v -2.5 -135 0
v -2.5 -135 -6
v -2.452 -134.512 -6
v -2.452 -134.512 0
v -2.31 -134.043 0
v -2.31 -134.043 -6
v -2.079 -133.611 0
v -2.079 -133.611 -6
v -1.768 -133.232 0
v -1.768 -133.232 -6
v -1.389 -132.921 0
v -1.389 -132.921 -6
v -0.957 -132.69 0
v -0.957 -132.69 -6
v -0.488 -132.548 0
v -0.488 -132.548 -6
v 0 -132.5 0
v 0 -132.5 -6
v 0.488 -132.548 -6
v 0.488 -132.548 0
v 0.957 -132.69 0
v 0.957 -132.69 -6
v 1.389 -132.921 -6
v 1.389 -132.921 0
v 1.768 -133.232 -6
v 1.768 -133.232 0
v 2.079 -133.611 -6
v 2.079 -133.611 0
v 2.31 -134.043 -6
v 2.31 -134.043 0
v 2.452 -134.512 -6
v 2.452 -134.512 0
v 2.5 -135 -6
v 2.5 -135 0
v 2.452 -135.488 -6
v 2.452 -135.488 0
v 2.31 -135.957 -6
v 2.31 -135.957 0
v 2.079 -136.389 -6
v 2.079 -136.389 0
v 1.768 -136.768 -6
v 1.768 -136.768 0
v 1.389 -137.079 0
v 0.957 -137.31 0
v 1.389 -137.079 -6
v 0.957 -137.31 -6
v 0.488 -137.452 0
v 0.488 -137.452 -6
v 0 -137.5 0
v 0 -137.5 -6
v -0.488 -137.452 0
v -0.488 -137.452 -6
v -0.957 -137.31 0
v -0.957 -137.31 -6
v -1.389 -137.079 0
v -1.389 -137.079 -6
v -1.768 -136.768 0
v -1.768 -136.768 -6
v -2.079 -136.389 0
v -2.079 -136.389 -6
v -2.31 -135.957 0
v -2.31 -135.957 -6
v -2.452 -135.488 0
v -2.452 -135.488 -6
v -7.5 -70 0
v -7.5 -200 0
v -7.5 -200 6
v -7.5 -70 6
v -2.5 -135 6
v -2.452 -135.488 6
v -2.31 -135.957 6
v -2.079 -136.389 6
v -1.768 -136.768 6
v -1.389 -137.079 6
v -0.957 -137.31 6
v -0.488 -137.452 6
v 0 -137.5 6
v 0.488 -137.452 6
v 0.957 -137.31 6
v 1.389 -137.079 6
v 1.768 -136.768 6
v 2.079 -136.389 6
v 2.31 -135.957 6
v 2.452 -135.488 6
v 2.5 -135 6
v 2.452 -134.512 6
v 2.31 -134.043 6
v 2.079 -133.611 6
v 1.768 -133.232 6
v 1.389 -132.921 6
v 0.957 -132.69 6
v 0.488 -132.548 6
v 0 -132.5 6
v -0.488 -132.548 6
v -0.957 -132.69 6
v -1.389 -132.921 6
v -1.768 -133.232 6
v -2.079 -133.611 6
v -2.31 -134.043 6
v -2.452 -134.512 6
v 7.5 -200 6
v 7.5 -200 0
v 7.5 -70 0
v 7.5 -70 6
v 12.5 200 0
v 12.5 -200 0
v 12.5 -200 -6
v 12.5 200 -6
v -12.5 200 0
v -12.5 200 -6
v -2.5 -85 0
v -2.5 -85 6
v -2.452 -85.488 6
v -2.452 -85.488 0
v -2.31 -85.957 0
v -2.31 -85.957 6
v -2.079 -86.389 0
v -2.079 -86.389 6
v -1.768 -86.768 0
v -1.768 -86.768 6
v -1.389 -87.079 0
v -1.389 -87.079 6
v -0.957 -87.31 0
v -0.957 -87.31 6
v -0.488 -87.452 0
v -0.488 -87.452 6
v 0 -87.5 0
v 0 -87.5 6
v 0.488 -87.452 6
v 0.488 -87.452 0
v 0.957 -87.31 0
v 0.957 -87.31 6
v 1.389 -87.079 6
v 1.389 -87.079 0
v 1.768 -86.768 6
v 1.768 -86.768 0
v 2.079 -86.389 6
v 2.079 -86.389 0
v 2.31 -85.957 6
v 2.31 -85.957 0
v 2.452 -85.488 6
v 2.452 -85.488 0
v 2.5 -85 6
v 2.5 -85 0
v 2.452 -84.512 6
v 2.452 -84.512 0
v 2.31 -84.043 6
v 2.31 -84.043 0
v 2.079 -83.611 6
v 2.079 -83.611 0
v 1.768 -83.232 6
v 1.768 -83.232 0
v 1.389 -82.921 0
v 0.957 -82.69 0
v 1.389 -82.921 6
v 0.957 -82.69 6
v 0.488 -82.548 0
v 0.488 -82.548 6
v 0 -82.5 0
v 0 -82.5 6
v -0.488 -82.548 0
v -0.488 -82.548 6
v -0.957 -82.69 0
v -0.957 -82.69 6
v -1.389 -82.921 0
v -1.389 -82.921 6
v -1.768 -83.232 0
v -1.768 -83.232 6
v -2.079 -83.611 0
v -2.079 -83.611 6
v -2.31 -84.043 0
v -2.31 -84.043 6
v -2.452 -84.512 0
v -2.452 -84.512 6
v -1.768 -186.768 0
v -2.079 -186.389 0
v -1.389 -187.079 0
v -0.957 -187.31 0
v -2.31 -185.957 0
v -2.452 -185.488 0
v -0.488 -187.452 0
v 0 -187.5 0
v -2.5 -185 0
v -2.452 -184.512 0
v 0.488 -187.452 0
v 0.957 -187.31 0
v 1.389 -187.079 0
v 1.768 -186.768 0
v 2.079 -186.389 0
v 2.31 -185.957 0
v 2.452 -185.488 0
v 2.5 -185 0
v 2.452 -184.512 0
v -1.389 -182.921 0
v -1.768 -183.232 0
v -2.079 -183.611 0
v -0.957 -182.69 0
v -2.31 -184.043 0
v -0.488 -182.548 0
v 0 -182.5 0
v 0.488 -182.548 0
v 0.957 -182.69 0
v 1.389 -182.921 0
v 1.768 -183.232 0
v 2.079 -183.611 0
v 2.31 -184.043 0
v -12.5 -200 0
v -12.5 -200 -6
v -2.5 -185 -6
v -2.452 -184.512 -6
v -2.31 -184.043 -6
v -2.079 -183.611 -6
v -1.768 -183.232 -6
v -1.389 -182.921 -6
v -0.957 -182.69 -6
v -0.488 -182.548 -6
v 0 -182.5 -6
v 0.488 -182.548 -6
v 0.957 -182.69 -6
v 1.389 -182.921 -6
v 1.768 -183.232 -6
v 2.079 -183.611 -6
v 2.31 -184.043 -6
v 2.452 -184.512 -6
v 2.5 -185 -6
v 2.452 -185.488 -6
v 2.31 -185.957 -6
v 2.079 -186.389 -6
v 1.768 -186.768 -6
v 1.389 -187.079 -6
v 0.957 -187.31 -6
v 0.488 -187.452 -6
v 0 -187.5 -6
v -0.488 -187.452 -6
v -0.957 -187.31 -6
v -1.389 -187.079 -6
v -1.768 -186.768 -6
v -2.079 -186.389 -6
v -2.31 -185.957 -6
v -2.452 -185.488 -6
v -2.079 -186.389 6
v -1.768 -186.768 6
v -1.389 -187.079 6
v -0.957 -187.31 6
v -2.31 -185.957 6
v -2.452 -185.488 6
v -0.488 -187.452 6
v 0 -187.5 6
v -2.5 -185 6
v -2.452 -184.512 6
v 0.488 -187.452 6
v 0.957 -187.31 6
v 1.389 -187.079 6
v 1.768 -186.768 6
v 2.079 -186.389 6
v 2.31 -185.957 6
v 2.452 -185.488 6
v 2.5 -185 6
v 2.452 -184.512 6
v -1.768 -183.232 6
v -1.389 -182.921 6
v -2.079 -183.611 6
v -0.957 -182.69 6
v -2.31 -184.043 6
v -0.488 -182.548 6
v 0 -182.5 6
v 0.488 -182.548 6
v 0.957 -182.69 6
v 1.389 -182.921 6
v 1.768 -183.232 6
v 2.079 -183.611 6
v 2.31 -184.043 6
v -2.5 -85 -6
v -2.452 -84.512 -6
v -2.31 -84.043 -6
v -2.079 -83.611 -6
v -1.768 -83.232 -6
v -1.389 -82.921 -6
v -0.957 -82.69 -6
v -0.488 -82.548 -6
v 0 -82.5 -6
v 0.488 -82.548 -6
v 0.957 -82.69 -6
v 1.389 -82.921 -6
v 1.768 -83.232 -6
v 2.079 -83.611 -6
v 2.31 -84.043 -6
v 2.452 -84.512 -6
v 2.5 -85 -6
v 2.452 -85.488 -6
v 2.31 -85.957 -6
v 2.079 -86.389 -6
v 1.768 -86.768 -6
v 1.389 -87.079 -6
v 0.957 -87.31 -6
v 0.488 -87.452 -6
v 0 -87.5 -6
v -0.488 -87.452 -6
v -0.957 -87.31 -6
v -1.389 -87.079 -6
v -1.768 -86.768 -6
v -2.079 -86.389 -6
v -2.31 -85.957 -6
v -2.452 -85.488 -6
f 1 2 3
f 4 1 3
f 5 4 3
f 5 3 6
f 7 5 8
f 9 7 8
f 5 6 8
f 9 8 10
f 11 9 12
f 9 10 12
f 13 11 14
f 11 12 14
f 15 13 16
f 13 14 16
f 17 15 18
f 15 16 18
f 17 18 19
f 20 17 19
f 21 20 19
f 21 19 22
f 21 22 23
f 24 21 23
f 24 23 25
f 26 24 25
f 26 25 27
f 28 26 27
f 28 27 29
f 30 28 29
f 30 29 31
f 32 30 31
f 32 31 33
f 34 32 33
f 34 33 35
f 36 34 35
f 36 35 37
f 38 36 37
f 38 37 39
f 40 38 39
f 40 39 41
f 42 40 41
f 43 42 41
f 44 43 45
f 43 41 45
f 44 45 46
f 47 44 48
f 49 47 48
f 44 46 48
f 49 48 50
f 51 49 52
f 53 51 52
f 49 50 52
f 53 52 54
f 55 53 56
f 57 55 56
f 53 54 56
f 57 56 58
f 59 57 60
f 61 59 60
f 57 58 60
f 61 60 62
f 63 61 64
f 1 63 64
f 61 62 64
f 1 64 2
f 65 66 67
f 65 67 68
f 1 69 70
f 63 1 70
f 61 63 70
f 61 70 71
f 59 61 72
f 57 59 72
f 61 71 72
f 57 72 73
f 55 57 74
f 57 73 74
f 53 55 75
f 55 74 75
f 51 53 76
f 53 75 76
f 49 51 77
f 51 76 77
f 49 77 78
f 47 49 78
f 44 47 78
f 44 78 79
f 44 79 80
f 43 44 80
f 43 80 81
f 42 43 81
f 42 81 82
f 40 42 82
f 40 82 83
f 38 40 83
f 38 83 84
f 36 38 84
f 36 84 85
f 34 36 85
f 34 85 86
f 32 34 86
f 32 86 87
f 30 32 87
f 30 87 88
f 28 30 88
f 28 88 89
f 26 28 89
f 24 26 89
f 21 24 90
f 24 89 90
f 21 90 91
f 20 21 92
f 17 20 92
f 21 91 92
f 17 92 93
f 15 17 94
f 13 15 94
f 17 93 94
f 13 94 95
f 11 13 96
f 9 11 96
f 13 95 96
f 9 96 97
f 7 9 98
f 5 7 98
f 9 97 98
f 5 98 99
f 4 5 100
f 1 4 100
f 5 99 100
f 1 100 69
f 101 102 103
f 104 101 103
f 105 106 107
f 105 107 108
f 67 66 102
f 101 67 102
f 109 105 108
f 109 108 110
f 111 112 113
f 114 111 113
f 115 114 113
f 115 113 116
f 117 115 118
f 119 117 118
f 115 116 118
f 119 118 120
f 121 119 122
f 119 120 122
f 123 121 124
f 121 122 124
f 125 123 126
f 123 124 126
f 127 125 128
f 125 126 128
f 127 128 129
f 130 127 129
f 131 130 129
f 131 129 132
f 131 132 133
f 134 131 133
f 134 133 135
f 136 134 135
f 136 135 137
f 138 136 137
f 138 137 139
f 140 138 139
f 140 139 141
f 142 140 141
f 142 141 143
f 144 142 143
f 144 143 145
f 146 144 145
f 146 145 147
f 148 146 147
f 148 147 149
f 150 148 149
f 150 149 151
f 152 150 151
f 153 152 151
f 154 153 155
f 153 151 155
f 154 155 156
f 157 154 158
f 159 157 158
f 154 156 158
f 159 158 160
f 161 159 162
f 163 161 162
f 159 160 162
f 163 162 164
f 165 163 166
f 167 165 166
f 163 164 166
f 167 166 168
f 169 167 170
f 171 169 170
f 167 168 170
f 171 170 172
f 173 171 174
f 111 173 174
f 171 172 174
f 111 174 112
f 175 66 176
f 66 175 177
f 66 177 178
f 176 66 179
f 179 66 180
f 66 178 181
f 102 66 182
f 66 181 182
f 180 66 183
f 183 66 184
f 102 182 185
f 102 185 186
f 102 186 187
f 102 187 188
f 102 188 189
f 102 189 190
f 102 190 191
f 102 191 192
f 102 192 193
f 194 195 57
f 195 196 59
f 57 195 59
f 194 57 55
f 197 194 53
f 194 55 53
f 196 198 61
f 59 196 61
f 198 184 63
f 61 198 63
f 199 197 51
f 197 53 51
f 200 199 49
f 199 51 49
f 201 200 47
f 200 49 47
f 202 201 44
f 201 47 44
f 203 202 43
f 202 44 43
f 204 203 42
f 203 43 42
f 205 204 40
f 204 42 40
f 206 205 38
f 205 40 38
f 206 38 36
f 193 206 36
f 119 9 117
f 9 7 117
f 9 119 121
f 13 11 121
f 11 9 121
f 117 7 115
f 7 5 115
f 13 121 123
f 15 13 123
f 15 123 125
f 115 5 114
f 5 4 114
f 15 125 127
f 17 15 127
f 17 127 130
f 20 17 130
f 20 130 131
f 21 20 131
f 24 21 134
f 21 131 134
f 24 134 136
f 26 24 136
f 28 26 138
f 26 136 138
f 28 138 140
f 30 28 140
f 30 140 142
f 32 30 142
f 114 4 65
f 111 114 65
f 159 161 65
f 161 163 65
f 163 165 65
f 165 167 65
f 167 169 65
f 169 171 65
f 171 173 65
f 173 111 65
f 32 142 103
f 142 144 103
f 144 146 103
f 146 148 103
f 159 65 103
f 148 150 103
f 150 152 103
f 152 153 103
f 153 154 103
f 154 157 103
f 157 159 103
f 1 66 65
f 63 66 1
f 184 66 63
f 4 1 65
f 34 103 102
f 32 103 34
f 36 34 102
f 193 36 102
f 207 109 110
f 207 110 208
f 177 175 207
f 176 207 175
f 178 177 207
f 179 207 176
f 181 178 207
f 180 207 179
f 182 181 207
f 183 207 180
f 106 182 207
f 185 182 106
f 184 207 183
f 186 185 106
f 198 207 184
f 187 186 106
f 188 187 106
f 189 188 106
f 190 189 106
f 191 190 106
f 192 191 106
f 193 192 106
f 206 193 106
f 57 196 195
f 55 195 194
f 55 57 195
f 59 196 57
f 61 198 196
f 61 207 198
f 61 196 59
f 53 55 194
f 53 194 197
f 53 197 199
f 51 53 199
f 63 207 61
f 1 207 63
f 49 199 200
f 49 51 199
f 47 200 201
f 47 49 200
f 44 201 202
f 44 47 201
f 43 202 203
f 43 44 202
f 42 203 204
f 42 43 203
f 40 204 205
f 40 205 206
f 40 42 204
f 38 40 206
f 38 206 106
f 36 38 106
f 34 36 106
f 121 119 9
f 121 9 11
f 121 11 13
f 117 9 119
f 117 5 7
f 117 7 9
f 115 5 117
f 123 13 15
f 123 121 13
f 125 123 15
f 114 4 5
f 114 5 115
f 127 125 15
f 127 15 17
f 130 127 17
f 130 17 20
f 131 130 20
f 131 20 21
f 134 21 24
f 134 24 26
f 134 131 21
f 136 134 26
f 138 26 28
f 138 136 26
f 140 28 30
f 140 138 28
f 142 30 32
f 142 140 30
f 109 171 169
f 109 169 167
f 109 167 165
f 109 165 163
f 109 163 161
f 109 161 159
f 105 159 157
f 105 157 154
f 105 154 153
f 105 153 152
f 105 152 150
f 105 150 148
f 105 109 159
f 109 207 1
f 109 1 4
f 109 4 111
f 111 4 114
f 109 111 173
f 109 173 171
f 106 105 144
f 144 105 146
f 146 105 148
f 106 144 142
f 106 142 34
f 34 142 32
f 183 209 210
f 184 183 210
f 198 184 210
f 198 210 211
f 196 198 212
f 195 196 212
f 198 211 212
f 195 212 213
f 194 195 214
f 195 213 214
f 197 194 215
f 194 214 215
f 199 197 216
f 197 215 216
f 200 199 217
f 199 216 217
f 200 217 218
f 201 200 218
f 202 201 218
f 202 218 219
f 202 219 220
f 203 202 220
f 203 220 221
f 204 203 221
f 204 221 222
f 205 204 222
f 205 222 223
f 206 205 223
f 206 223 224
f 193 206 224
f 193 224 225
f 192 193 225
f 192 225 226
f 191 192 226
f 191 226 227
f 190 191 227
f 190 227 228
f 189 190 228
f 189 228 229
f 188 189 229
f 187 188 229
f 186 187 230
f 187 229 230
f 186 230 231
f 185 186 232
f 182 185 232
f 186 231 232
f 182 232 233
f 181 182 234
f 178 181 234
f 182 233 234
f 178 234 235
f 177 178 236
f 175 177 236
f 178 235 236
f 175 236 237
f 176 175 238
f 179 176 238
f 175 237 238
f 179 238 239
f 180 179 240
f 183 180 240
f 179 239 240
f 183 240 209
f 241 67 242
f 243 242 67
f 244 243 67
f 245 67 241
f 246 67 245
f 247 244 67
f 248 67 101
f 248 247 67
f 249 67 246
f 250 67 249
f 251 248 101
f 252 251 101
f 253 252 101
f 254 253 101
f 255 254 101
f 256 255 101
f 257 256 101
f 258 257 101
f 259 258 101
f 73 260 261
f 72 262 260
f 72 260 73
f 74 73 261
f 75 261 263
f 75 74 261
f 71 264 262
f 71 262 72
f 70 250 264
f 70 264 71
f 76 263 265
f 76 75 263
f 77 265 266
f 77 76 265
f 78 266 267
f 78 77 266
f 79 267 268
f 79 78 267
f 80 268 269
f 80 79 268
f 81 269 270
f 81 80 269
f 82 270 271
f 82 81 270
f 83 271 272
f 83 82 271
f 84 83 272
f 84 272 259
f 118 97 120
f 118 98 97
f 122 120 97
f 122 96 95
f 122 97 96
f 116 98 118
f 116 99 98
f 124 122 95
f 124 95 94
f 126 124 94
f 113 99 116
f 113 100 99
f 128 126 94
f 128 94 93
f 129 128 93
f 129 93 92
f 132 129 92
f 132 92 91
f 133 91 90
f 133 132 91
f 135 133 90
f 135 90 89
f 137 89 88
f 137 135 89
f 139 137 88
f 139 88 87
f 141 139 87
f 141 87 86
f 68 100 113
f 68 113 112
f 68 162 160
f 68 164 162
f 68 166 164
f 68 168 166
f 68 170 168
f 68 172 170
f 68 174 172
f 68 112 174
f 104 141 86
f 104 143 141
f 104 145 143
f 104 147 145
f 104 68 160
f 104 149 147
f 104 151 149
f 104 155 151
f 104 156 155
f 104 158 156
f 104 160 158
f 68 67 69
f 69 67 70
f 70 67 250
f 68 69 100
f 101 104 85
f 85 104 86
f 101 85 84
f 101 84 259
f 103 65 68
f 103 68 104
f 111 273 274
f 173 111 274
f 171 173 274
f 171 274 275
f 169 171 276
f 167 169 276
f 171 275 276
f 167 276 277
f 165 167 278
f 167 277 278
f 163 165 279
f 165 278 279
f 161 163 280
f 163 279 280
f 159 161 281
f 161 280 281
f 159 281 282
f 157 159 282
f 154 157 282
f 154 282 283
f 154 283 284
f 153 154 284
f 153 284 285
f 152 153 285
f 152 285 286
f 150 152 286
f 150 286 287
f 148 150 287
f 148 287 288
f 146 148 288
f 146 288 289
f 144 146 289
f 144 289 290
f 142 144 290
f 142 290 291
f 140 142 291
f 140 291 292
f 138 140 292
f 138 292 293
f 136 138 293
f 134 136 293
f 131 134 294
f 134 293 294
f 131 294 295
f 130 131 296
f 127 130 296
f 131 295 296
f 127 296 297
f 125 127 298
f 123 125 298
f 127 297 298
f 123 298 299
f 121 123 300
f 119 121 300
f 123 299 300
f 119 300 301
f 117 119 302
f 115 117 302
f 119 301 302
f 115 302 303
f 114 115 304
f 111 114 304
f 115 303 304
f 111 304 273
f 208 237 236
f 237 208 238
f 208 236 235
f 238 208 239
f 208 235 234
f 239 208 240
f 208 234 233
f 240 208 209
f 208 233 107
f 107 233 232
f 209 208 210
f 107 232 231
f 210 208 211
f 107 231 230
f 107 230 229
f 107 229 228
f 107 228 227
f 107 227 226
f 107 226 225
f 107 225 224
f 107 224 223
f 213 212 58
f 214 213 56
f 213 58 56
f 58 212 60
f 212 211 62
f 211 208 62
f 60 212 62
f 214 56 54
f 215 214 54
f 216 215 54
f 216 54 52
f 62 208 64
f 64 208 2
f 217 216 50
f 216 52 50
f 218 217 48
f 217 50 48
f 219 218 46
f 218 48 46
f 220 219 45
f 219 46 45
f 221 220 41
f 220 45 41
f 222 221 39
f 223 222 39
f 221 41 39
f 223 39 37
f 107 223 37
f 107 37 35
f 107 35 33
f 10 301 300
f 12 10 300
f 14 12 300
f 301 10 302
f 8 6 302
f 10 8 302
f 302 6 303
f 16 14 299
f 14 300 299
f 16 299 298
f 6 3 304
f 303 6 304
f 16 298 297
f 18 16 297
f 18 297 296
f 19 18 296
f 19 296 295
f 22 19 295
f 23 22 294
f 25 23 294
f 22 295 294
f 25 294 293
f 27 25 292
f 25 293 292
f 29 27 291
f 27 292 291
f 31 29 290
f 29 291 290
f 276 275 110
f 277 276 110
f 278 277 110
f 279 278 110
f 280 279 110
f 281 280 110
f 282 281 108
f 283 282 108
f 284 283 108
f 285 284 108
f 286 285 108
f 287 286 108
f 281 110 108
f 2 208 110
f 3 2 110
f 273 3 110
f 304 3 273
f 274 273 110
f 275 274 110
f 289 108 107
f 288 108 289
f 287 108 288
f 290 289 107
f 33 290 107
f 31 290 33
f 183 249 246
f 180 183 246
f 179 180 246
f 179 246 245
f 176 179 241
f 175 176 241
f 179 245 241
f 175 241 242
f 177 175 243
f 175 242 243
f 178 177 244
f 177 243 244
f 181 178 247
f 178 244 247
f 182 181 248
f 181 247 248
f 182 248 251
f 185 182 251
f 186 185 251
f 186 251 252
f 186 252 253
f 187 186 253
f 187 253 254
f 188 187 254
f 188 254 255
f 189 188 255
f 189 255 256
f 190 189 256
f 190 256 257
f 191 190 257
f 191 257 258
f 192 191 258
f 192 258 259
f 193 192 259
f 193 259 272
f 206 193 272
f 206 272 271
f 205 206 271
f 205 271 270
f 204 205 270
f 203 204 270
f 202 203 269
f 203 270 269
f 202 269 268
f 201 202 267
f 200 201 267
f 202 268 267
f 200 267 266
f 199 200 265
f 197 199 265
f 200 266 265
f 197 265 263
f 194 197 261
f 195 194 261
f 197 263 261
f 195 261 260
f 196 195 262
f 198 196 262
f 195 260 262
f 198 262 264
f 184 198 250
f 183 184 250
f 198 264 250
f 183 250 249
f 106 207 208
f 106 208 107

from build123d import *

# Parameters (mm, degrees)
F0_W     = 15
F0_H     = 130
F1_DEPTH = 6
F2_DEPTH = 6
F3_D     = 5
F4_D     = 5


with BuildPart() as f1:
    # F0 (on Top) → F1 (new body)
    with BuildSketch(Plane.XY):
        Polygon((-12.5, 200), (-12.5, -200), (-7.5, -200), (-7.5, -70), (7.5, -70), (7.5, -200), (12.5, -200), (12.5, 200), align=None)
        with Locations((0, -135)):
            Rectangle(F0_W, F0_H)
    extrude(amount=-F1_DEPTH)

    # F3 (through all)
    with Locations(Plane.XY):
        with Locations((0, -135), (0, -185), (0, -85)):
            Hole(F3_D / 2)


with BuildPart() as f2:
    # F0 (on Top) → F2 (new body)
    with BuildSketch(Plane.XY):
        with Locations((0, -135)):
            Rectangle(F0_W, F0_H)
    extrude(amount=F2_DEPTH)

    # F4 (through all)
    with Locations(Plane(origin=(0, 0, 0), x_dir=(1, 0, 0), z_dir=(0, 0, -1))):
        with Locations((0, 185), (0, 135), (0, 85)):
            Hole(F4_D / 2)


solid = Compound([f1.part, f2.part])
